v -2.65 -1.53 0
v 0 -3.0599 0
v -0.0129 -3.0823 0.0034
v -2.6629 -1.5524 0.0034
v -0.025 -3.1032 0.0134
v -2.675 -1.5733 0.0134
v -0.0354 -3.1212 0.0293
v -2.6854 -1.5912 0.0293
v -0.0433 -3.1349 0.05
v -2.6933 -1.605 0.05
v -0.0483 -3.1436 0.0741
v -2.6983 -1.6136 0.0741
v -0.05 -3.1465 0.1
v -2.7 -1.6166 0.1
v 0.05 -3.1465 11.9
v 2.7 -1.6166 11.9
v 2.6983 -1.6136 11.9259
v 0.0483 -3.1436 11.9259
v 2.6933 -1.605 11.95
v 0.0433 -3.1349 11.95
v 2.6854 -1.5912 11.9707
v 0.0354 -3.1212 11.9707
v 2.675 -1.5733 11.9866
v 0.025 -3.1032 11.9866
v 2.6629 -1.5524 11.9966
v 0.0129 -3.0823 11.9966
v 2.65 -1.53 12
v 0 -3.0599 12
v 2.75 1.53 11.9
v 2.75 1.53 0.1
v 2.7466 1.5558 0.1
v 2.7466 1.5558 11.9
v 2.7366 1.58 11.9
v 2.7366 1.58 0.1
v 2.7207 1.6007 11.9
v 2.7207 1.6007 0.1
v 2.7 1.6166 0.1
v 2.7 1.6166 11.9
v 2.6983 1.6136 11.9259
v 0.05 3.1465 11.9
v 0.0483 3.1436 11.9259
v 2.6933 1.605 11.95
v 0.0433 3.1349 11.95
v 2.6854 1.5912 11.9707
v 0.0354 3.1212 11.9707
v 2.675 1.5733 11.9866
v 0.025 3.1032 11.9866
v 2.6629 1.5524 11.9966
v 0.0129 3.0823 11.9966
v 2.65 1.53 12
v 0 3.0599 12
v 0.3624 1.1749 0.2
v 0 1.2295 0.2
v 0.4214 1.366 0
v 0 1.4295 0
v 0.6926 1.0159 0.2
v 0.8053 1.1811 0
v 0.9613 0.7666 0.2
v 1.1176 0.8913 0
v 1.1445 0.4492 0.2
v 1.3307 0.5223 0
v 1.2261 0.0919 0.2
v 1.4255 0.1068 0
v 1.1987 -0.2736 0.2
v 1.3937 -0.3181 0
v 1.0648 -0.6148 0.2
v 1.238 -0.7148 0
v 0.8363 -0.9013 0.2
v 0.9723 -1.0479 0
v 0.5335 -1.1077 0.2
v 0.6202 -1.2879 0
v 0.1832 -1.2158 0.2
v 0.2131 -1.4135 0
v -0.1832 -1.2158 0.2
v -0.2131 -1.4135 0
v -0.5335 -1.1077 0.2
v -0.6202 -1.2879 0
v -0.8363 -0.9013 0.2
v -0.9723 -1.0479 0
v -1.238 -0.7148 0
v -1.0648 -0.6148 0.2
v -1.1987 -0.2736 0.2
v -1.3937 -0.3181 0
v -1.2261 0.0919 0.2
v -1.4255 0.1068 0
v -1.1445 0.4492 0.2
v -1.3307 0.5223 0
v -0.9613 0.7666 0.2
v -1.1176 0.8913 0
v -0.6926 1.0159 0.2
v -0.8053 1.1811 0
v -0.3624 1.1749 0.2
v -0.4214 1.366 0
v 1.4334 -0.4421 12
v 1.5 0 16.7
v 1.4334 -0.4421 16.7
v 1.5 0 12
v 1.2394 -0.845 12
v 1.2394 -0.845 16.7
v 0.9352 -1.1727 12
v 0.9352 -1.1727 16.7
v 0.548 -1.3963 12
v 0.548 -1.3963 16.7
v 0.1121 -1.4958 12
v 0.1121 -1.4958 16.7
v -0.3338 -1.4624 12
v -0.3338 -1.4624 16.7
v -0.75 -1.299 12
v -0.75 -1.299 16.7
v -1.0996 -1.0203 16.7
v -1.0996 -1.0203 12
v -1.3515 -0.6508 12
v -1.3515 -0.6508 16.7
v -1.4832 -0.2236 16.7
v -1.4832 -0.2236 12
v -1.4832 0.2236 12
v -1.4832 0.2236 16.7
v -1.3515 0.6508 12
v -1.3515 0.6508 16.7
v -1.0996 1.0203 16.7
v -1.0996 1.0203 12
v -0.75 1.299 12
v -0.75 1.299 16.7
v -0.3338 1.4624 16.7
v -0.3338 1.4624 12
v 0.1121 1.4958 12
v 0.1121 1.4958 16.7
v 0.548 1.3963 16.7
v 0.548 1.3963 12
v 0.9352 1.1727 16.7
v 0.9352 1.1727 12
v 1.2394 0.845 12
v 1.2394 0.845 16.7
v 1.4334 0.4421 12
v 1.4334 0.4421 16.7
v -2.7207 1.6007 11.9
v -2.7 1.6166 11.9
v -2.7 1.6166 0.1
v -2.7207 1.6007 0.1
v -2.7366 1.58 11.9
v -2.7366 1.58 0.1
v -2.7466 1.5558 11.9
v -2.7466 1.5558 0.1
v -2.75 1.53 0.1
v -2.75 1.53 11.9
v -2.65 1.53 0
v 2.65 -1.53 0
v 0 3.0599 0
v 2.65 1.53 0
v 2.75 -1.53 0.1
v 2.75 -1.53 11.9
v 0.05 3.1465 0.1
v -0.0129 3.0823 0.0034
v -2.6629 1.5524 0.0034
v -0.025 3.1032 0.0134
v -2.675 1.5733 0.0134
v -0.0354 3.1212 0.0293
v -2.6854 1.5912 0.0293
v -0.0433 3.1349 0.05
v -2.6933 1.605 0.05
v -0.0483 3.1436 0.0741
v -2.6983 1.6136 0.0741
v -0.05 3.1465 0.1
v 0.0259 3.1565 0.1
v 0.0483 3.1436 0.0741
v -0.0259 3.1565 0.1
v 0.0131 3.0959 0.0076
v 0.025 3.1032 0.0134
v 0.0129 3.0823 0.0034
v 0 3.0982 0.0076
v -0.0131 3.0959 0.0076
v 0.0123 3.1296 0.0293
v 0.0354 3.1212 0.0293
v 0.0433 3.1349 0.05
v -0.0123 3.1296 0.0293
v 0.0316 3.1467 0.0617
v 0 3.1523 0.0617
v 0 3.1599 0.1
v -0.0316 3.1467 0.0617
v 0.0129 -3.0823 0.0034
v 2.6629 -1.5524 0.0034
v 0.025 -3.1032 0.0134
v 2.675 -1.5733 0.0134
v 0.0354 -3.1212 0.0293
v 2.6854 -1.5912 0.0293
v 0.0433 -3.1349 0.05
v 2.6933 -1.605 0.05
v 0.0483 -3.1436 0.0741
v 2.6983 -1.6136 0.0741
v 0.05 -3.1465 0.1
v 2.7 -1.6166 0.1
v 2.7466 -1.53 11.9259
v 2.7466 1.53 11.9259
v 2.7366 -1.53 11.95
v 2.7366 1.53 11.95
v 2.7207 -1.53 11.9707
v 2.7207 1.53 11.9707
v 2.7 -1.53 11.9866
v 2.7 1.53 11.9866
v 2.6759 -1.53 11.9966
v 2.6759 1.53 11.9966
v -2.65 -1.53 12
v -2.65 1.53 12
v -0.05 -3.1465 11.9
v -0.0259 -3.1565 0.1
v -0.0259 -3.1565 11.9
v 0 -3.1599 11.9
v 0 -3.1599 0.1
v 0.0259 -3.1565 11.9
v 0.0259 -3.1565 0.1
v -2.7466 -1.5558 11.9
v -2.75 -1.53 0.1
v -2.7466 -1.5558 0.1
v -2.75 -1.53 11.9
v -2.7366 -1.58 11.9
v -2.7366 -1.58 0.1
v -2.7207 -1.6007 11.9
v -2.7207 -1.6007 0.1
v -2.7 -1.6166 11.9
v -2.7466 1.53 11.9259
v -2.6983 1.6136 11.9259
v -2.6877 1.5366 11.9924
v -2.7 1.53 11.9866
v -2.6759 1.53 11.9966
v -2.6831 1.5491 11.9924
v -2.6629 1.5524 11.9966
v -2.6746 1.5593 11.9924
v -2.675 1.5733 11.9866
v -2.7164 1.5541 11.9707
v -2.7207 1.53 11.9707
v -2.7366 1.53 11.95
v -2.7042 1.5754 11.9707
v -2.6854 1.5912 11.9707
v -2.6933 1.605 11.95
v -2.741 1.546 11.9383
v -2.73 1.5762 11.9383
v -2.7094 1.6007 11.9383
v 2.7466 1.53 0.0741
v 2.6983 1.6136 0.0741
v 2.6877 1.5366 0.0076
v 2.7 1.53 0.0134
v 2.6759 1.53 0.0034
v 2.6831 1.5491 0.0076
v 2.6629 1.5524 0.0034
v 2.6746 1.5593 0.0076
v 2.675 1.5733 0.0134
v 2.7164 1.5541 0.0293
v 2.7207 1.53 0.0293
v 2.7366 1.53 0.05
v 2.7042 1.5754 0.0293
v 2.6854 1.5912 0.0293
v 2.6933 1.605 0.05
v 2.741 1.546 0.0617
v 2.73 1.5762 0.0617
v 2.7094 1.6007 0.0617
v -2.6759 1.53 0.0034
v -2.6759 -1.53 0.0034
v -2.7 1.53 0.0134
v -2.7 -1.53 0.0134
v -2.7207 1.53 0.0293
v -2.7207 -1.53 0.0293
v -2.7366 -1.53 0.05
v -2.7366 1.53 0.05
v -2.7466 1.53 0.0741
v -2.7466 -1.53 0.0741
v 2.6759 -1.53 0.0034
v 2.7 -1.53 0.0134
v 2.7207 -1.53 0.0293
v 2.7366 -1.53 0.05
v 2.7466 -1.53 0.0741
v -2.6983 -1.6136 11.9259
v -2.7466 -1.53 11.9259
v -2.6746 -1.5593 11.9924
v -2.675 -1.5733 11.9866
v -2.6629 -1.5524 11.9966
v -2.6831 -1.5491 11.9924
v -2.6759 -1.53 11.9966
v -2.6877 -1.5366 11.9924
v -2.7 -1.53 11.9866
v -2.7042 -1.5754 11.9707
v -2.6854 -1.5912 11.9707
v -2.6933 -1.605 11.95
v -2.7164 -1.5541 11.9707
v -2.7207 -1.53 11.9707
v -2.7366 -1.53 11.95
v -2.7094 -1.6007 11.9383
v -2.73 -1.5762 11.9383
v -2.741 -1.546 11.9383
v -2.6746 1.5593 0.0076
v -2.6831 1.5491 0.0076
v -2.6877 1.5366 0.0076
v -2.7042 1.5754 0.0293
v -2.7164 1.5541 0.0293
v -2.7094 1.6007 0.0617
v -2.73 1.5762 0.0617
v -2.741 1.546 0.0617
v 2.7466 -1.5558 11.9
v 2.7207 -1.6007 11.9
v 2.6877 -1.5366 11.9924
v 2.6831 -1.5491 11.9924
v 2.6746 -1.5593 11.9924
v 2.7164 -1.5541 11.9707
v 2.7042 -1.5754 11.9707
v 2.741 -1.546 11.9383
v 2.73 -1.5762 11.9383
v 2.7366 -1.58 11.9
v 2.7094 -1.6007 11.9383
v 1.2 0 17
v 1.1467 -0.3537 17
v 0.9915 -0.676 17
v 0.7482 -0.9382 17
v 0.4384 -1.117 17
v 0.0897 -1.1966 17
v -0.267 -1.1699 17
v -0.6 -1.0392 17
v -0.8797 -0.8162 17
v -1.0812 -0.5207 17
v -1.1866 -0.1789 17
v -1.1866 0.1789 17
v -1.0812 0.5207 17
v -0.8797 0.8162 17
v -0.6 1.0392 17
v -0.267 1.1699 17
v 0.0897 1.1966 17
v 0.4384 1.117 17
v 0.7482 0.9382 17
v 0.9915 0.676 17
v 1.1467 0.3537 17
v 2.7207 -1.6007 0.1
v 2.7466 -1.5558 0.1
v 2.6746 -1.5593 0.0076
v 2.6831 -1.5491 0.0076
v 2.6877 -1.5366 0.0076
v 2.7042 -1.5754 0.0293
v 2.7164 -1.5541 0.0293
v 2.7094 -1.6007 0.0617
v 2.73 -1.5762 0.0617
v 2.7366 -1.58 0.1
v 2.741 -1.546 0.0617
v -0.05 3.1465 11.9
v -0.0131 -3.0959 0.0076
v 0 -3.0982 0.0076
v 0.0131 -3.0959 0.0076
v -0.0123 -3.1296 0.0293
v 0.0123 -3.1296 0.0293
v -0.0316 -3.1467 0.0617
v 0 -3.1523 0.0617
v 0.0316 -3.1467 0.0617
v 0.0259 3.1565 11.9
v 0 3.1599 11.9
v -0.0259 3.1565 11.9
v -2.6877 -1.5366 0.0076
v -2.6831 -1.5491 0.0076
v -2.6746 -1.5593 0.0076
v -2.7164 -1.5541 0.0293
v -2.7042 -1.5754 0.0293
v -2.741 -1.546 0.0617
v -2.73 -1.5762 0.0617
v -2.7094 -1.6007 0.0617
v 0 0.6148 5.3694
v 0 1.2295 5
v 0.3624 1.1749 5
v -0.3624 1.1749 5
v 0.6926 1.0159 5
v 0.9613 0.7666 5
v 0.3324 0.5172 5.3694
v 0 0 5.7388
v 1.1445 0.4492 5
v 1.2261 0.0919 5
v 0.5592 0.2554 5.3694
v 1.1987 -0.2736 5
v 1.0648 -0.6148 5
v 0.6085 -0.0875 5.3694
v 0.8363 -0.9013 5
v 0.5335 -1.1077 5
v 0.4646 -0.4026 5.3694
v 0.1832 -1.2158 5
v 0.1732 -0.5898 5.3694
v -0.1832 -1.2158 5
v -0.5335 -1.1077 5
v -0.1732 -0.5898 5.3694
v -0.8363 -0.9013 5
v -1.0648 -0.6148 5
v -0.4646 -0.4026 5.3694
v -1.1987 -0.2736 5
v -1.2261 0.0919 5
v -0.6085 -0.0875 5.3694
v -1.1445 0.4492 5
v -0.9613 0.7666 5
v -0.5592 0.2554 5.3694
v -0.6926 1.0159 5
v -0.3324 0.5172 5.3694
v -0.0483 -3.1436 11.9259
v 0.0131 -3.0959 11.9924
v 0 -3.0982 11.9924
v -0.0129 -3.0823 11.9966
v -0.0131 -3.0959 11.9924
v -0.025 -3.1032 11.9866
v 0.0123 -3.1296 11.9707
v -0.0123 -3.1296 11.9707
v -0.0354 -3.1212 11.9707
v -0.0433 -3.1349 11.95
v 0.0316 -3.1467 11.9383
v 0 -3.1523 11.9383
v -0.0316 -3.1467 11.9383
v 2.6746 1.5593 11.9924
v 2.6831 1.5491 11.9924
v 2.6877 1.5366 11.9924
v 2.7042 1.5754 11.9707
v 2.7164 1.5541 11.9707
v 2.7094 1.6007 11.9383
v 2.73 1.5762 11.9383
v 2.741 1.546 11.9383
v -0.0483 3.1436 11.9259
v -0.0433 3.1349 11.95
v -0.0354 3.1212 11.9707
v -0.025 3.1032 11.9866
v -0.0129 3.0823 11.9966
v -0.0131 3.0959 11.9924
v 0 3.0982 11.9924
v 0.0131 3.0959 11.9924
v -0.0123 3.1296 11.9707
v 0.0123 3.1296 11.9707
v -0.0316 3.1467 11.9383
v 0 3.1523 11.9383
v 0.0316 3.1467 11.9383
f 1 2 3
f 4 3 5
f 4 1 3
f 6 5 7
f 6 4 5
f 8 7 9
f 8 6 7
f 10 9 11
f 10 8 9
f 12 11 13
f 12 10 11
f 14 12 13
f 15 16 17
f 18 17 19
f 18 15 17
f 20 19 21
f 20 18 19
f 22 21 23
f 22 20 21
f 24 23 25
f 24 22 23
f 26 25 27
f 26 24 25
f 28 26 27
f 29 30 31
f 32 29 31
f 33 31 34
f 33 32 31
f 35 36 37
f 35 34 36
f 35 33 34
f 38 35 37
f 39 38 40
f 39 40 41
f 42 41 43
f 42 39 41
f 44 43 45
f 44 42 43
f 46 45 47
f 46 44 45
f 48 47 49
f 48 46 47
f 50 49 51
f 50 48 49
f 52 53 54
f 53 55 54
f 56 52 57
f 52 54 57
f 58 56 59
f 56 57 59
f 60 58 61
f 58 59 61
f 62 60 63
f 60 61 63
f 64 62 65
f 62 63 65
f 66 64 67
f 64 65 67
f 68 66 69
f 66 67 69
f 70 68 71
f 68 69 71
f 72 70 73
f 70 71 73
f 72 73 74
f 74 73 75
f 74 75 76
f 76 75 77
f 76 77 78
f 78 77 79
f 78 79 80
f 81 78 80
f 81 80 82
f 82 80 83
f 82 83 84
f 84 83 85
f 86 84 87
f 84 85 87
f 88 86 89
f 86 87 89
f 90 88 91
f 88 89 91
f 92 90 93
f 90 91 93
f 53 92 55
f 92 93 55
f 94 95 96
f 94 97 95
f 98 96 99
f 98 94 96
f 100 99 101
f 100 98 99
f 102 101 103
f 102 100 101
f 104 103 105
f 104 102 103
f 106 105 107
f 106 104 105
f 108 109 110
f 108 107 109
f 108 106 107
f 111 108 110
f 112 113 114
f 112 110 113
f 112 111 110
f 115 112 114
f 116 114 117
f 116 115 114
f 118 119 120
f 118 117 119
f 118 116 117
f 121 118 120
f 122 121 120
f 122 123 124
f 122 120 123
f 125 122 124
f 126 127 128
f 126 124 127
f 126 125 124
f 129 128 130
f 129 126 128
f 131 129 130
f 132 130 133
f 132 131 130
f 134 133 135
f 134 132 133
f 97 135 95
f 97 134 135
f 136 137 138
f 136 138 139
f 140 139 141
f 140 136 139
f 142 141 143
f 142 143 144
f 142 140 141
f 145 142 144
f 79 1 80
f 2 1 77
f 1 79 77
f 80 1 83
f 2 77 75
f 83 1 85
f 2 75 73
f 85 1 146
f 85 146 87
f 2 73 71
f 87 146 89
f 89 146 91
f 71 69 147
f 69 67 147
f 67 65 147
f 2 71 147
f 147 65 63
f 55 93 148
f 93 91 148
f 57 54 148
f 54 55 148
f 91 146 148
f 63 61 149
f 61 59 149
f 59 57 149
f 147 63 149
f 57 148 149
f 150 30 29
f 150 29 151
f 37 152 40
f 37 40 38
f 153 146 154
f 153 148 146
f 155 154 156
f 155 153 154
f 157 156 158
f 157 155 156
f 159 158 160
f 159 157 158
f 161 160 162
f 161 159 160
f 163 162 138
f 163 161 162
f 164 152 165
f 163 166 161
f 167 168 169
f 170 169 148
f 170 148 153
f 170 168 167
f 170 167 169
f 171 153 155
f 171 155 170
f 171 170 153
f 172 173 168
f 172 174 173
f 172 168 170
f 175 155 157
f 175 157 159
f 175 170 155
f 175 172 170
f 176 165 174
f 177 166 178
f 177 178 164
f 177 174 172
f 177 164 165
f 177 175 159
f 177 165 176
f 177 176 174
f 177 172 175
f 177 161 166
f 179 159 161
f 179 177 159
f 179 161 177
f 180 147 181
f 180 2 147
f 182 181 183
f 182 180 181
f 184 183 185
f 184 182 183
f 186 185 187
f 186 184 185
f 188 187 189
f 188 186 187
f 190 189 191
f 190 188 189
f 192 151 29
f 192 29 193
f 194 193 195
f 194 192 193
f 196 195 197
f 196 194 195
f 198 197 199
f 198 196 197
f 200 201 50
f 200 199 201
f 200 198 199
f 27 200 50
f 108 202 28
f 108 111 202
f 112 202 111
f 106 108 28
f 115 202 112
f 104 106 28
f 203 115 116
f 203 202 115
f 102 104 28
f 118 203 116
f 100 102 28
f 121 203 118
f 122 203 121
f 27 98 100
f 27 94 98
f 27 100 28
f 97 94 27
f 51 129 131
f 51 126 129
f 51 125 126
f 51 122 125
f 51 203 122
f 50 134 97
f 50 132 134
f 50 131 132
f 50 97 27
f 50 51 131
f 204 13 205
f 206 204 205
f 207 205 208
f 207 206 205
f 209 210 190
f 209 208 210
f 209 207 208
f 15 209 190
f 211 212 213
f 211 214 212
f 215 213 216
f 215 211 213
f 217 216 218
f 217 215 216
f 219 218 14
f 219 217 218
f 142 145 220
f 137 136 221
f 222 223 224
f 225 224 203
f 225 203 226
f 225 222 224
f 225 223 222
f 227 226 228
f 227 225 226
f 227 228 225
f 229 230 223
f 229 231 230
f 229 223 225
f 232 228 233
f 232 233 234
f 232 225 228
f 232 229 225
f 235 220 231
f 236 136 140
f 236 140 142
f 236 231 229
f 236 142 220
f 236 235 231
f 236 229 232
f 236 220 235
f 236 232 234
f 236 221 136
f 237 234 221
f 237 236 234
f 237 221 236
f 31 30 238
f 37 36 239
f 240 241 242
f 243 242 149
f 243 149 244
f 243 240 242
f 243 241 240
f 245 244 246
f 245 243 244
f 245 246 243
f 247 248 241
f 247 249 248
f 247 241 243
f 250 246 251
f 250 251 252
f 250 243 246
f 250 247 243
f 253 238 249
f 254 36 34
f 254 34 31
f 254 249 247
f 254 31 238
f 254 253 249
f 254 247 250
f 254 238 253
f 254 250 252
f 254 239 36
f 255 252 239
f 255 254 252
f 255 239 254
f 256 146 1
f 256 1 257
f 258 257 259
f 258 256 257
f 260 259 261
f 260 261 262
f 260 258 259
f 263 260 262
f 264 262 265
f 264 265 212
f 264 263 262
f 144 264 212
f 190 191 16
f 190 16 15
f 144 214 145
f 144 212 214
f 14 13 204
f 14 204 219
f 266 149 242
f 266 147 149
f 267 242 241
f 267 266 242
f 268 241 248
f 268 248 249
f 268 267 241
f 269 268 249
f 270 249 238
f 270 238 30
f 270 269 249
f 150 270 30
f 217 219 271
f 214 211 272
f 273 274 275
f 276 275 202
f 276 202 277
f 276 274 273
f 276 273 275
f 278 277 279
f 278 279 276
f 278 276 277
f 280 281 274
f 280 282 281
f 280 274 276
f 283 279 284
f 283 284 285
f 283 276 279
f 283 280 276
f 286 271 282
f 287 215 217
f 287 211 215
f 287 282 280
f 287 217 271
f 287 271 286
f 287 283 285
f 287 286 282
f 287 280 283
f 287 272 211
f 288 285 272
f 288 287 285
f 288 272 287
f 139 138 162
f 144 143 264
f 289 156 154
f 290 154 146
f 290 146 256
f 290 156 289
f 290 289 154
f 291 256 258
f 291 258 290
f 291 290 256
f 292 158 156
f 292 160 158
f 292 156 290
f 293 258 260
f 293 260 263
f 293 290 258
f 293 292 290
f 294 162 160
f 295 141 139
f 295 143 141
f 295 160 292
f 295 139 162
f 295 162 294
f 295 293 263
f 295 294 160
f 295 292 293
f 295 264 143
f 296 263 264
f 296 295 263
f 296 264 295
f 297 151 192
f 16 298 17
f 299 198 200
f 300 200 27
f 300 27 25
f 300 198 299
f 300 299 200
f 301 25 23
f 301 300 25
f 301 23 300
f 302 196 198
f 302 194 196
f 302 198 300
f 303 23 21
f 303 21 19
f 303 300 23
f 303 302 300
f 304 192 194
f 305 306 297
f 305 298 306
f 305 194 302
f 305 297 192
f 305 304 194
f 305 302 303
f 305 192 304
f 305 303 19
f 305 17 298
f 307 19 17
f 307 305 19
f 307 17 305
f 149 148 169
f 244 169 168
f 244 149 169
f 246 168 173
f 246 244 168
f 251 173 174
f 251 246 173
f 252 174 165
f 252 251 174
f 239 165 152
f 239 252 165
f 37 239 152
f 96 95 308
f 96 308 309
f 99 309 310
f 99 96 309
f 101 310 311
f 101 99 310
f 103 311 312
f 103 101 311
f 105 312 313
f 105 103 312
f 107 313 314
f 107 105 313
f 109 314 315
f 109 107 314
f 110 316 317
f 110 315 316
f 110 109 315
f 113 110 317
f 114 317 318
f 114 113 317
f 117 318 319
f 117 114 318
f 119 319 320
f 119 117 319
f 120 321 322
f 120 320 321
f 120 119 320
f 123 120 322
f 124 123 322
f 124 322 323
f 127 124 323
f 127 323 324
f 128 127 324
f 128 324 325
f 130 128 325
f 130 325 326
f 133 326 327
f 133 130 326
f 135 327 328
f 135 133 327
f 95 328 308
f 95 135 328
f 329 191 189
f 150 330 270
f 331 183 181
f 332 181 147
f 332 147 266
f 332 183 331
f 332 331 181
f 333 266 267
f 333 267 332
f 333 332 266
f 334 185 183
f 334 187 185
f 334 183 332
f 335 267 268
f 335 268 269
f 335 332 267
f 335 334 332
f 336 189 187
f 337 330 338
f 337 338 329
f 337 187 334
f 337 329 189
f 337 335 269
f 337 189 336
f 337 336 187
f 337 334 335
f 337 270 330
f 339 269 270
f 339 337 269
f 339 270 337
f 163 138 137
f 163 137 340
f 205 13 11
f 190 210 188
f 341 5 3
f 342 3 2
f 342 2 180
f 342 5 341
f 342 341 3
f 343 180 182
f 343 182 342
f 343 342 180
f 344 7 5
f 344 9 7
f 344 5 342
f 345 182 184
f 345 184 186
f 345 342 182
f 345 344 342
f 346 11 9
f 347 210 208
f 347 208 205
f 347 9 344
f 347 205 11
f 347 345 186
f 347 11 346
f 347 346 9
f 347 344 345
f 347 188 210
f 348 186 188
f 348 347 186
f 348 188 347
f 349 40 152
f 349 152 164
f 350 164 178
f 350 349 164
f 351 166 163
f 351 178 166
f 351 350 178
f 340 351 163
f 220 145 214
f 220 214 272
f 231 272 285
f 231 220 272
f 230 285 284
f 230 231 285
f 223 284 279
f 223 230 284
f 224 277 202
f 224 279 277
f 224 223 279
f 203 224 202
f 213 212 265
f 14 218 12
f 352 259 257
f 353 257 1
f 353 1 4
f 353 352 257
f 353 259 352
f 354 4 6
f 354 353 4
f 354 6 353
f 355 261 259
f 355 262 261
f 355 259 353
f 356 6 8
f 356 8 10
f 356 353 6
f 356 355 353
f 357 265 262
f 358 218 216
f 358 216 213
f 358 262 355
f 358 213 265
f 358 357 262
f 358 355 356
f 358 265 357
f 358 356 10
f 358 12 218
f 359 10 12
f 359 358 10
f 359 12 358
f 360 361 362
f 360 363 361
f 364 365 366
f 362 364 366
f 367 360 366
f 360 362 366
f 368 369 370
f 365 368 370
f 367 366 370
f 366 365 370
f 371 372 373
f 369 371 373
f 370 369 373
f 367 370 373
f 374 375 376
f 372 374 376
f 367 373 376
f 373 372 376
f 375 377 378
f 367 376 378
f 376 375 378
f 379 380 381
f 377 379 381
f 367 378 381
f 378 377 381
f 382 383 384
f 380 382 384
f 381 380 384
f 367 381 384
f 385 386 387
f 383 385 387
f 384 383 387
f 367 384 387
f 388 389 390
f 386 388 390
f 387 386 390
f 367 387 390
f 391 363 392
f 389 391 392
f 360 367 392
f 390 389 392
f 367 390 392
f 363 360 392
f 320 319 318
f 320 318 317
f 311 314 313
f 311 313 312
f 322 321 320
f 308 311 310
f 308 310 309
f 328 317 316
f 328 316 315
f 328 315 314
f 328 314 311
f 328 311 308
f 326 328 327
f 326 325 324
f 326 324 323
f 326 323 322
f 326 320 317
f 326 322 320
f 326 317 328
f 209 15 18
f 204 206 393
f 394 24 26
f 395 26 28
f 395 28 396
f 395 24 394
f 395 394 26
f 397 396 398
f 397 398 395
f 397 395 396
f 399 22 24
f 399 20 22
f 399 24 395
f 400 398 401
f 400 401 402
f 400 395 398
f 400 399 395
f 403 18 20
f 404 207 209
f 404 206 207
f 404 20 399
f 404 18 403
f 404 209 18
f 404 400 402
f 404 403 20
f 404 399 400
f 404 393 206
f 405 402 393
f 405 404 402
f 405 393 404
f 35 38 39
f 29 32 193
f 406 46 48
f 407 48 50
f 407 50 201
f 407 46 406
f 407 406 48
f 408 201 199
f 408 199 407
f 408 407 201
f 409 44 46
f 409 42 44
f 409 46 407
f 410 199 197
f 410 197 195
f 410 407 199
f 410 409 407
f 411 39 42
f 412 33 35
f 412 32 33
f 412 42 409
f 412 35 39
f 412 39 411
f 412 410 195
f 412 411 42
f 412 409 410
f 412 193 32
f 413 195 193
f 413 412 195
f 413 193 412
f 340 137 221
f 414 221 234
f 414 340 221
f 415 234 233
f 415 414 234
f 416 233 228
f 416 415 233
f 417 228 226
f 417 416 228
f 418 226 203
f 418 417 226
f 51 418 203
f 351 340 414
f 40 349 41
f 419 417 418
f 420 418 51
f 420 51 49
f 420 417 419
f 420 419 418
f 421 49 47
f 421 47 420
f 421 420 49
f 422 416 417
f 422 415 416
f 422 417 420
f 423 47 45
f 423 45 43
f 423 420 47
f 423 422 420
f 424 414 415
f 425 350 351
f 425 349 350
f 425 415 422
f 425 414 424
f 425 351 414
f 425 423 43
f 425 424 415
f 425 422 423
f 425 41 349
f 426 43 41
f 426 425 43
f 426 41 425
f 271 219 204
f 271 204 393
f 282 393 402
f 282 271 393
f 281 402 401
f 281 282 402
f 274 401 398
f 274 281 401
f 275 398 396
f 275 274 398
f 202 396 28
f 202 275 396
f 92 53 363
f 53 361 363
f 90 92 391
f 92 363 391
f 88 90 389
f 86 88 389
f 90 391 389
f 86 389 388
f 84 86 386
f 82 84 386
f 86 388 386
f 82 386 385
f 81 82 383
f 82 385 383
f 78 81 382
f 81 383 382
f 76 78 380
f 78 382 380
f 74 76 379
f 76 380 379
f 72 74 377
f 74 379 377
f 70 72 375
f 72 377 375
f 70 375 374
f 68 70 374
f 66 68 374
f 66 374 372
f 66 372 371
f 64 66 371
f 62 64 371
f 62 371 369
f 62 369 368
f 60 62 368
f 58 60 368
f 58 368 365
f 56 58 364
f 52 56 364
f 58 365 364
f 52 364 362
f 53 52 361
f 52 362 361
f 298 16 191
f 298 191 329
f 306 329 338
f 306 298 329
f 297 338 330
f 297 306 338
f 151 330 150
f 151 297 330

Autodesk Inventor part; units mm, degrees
ref_plane "YZ Plane" through (0, 0, 0) normal (1, 0, 0) x (0, 1, 0)
ref_plane "XZ Plane" through (0, 0, 0) normal (0, 1, 0) x (-1, 0, 0)
ref_plane "XY Plane" through (0, 0, 0) normal (0, 0, 1) x (1, 0, 0)
sketch "スケッチ1" plane through (0, 0, 0) normal (0, 0, 1) x (1, 0, 0)
  line L0 (0, 3.1754) -> (2.75, 1.5877)
  line L1 (2.75, 1.5877) -> (2.75, -1.5877)
  line L2 (2.75, -1.5877) -> (0, -3.1754)
  line L3 (0, -3.1754) -> (-2.75, -1.5877)
  line L4 (-2.75, -1.5877) -> (-2.75, 1.5877)
  line L5 (-2.75, 1.5877) -> (0, 3.1754)
  point P0 (0, 0)
  point P1 (0, 0)
  dimension "d0" = 5.5
extrude "押し出し1" add sketch "スケッチ1" along normal blind 12
sketch "スケッチ2" plane through (0, 0, 12) normal (0, 0, 1) x (1, 0, 0)
  circle A0 centre (0, 0) radius 1.5
  dimension "d3" = 3
extrude "押し出し2" add sketch "スケッチ2" along normal blind 5
thread "ねじ1" size "M3x0.5" class "6g" standard "ANSI Metric M Profile" length 12
chamfer "面取り1" distance 0.3 angle 45 1 edges at (-1.5, 0, 17)
fillet "フィレット1" radius 0.1 18 edges at (-1.375, 2.3816, 12) (1.375, 2.3816, 12) (2.75, 0, 12) (1.375, -2.3816, 12) (-1.375, -2.3816, 12) (-2.75, 0, 12) (-2.75, -1.5877, 6) (0, -3.1754, 6) (2.75, -1.5877, 6) (2.75, 1.5877, 6) (0, 3.1754, 6) (-2.75, 1.5877, 6) (-1.375, 2.3816, 0) (1.375, 2.3816, 0) (2.75, 0, 0) (1.375, -2.3816, 0) (-1.375, -2.3816, 0) (-2.75, 0, 0)
sketch "スケッチ3" plane through (0, 0, 0) normal (0, 0, -1) x (-1, 0, 0)
  point P0 (0, 0)
hole "穴1" at (0, 0, 0) direction (0, 0, 1) diameter 2.459 depth 5 tip angle 118 thread size "M3x0.5" class "6H" standard "ANSI Metric M Profile"
chamfer "面取り2" distance 0.2 angle 45 1 edges at (0, -1.2295, 0)
properties part number "hexagonal_spacer_M3_12mm" material "ABS プラスチック"
